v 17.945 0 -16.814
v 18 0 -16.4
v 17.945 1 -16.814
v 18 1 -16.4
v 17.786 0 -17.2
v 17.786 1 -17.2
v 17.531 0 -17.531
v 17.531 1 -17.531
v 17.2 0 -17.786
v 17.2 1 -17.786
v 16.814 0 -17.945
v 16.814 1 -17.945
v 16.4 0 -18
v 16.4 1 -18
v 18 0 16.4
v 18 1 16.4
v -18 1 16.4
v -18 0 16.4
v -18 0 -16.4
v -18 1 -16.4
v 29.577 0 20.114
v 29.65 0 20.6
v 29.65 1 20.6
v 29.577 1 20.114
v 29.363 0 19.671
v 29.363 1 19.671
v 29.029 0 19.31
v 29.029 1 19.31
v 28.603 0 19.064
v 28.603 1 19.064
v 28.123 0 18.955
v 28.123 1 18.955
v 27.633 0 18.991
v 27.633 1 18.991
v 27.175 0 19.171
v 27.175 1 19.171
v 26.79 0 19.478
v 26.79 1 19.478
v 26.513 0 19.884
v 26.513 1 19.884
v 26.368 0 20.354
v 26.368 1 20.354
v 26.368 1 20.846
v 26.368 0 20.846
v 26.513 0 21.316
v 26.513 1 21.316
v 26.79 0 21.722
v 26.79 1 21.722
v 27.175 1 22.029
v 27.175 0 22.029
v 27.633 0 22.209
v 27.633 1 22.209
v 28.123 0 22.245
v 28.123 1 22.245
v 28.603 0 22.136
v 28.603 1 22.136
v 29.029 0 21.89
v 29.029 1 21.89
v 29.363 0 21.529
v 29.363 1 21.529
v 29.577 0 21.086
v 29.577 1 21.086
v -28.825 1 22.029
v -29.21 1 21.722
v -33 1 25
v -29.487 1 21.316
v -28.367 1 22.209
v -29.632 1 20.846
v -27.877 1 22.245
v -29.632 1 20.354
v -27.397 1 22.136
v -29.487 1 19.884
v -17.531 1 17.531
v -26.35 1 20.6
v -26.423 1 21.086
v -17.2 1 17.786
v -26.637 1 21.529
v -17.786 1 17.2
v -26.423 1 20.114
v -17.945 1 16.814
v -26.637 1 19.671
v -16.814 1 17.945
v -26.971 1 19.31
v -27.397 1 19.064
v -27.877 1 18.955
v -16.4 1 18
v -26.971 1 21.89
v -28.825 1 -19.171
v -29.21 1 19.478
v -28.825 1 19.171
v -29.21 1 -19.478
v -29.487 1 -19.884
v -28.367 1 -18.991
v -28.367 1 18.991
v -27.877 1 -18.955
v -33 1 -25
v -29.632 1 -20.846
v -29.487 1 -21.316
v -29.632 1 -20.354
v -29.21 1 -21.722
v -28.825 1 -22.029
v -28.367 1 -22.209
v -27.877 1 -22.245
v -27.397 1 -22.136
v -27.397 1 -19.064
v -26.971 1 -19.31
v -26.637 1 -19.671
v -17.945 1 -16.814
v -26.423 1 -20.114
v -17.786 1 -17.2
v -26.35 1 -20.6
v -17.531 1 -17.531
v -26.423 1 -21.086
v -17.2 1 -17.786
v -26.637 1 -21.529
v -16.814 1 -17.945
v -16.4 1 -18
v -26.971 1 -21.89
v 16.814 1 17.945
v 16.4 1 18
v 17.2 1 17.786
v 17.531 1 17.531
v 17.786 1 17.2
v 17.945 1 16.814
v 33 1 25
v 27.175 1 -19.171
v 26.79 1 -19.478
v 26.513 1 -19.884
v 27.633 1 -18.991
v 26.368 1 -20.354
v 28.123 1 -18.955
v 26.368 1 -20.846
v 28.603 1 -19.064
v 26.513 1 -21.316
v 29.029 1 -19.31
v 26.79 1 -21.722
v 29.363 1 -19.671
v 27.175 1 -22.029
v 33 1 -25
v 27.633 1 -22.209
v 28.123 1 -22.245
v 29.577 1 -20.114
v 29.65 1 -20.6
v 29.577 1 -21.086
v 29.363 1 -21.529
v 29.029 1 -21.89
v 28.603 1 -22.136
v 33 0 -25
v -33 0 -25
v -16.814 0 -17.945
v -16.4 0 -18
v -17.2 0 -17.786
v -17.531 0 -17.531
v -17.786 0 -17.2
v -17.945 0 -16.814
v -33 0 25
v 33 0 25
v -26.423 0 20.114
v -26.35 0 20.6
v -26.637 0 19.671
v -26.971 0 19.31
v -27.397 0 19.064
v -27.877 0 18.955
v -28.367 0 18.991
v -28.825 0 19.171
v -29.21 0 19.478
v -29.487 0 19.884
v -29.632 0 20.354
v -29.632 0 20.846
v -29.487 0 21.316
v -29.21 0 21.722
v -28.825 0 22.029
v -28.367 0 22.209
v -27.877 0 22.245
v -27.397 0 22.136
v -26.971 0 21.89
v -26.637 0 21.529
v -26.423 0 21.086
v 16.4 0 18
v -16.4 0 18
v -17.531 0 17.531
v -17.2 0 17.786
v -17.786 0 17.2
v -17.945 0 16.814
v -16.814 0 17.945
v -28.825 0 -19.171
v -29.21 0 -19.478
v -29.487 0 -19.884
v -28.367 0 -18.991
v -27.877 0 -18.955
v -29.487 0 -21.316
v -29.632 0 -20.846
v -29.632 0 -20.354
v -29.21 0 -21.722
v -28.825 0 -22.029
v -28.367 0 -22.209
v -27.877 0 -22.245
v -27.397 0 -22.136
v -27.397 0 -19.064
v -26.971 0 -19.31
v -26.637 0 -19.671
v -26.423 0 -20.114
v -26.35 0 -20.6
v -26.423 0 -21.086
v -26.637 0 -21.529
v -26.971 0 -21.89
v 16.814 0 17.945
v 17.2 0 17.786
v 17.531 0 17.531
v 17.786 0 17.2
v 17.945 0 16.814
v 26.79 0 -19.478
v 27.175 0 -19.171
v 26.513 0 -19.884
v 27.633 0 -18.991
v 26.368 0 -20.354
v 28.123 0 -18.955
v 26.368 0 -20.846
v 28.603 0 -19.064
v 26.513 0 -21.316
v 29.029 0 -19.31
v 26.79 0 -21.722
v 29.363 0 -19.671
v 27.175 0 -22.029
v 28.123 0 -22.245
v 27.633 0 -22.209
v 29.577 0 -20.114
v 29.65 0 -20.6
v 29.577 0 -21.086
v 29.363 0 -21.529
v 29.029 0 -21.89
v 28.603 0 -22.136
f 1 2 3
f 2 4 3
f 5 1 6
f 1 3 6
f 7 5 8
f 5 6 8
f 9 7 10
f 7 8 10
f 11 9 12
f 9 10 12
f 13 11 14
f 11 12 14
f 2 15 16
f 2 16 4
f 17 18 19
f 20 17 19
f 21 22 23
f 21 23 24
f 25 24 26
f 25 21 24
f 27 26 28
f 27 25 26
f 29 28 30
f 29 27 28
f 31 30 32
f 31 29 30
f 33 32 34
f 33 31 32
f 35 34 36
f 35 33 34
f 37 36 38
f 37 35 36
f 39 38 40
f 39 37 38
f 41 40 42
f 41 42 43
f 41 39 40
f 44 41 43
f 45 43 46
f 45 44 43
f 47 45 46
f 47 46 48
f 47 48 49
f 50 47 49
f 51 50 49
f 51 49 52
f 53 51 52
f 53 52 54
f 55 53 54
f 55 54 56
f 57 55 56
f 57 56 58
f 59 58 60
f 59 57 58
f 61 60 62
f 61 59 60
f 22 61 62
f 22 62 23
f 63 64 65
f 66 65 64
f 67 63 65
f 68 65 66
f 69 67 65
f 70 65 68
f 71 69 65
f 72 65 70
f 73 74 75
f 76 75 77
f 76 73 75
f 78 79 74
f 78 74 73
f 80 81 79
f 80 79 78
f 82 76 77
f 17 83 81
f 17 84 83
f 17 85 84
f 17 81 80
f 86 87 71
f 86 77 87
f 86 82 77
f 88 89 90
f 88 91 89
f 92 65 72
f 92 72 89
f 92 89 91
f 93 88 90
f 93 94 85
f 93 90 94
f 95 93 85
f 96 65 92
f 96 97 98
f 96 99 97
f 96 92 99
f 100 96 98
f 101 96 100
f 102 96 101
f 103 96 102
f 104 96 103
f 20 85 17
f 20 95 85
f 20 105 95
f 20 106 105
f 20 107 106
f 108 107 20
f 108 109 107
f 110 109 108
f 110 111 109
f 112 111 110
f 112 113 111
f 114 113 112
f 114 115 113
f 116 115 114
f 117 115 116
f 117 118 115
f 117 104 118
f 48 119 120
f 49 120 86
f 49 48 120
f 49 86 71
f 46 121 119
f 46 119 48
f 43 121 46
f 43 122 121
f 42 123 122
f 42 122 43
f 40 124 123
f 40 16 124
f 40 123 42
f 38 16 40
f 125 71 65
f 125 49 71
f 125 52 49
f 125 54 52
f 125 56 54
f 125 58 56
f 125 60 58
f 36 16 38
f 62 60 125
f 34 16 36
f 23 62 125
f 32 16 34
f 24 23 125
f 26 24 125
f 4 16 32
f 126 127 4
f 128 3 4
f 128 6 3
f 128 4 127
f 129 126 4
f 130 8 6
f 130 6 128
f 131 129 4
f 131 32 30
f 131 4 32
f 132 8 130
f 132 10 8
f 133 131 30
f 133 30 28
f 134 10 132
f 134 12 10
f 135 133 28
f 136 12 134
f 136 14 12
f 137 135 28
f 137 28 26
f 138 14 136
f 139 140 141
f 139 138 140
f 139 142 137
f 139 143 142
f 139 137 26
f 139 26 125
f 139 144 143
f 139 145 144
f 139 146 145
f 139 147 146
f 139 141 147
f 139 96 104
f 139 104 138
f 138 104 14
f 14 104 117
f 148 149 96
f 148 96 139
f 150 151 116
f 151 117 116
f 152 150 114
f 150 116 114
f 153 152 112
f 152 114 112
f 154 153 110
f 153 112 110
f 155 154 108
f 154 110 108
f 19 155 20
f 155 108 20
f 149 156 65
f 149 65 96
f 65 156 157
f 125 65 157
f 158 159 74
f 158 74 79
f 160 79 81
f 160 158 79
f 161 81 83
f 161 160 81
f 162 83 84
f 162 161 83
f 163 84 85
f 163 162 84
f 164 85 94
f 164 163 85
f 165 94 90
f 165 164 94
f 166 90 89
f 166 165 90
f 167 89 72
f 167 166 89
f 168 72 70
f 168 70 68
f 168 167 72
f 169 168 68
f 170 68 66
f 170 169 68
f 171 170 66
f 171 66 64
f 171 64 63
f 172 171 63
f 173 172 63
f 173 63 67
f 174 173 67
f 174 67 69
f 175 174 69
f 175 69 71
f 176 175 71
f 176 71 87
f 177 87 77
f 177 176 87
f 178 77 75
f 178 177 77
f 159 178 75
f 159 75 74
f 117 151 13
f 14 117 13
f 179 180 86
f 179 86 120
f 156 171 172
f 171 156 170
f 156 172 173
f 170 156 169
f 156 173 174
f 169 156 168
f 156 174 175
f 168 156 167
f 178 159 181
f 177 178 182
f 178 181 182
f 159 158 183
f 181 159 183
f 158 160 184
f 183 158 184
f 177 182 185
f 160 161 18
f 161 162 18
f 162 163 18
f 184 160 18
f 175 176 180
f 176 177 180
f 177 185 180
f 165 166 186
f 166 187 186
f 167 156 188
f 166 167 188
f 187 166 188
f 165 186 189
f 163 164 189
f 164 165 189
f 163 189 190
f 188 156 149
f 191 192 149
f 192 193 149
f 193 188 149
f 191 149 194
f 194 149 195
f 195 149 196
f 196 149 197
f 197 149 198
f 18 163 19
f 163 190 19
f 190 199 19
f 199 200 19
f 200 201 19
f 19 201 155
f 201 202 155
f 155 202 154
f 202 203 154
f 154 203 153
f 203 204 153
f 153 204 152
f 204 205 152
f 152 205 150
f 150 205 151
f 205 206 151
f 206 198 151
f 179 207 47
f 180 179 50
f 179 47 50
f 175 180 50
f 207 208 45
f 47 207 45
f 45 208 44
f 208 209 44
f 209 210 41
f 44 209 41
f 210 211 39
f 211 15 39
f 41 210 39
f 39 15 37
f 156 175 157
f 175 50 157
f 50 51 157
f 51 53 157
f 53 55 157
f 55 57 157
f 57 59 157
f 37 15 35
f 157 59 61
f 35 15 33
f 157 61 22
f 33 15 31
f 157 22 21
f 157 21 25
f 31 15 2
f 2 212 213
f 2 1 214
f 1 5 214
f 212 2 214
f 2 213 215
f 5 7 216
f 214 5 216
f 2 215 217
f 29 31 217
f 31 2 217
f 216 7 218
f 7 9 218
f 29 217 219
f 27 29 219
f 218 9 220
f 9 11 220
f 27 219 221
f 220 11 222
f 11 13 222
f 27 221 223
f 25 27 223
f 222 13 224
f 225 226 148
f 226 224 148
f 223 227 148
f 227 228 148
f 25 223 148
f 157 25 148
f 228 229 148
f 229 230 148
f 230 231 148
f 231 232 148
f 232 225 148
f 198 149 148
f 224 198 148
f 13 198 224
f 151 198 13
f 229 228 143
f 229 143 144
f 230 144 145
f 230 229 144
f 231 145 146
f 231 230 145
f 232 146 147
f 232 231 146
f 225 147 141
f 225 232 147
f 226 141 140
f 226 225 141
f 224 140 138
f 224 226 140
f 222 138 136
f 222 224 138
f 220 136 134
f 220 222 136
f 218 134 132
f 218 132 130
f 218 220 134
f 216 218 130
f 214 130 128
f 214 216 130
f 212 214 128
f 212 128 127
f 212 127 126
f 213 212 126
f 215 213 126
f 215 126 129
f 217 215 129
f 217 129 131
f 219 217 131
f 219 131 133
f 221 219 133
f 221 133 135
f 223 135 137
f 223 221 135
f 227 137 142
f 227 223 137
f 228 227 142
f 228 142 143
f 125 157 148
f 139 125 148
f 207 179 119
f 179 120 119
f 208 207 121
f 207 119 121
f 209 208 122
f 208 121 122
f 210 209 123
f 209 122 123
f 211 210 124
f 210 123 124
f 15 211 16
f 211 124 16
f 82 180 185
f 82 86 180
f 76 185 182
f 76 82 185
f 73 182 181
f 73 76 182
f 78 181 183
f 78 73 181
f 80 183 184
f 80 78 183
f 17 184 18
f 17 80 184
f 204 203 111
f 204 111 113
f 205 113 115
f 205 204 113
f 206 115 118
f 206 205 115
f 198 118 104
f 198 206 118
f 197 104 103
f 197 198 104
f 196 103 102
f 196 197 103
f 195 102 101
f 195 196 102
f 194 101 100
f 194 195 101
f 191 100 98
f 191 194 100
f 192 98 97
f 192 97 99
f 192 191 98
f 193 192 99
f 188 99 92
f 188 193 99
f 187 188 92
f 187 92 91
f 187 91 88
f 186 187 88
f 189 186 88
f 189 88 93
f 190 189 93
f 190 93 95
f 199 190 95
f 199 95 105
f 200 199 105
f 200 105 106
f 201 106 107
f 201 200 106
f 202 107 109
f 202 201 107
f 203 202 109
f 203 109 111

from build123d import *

# Parameters (mm, degrees)
SKETCH1_W           = 66
SKETCH1_H           = 50
SKETCH1_R           = 1.65
SKETCH1_W_2         = 36
SKETCH1_H_2         = 36
BOSS_EXTRUDE1_DEPTH = 1
FILLET1_R           = 1.6


with BuildPart() as part:
    # Sketch1 → Boss-Extrude1 (new body)
    with BuildSketch(Plane(origin=(0, 0, 0), x_dir=(1, 0, 0), z_dir=(0, 1, 0))):
        Rectangle(SKETCH1_W, SKETCH1_H)
        with Locations((-28, 20.6)):
            Circle(SKETCH1_R, mode=Mode.SUBTRACT)
        with Locations((-28, -20.6)):
            Circle(SKETCH1_R, mode=Mode.SUBTRACT)
        with Locations((28, 20.6)):
            Circle(SKETCH1_R, mode=Mode.SUBTRACT)
        with Locations((28, -20.6)):
            Circle(SKETCH1_R, mode=Mode.SUBTRACT)
        Rectangle(SKETCH1_W_2, SKETCH1_H_2, mode=Mode.SUBTRACT)
    extrude(amount=BOSS_EXTRUDE1_DEPTH)

    # Fillet1
    fillet1_edges = [part.edges().sort_by_distance(p)[0] for p in [
        (18, 0.5, 18),
        (18, 0.5, -18),
        (-18, 0.5, -18),
        (-18, 0.5, 18),
    ]]
    fillet(fillet1_edges, radius=FILLET1_R)


solid = part.part
